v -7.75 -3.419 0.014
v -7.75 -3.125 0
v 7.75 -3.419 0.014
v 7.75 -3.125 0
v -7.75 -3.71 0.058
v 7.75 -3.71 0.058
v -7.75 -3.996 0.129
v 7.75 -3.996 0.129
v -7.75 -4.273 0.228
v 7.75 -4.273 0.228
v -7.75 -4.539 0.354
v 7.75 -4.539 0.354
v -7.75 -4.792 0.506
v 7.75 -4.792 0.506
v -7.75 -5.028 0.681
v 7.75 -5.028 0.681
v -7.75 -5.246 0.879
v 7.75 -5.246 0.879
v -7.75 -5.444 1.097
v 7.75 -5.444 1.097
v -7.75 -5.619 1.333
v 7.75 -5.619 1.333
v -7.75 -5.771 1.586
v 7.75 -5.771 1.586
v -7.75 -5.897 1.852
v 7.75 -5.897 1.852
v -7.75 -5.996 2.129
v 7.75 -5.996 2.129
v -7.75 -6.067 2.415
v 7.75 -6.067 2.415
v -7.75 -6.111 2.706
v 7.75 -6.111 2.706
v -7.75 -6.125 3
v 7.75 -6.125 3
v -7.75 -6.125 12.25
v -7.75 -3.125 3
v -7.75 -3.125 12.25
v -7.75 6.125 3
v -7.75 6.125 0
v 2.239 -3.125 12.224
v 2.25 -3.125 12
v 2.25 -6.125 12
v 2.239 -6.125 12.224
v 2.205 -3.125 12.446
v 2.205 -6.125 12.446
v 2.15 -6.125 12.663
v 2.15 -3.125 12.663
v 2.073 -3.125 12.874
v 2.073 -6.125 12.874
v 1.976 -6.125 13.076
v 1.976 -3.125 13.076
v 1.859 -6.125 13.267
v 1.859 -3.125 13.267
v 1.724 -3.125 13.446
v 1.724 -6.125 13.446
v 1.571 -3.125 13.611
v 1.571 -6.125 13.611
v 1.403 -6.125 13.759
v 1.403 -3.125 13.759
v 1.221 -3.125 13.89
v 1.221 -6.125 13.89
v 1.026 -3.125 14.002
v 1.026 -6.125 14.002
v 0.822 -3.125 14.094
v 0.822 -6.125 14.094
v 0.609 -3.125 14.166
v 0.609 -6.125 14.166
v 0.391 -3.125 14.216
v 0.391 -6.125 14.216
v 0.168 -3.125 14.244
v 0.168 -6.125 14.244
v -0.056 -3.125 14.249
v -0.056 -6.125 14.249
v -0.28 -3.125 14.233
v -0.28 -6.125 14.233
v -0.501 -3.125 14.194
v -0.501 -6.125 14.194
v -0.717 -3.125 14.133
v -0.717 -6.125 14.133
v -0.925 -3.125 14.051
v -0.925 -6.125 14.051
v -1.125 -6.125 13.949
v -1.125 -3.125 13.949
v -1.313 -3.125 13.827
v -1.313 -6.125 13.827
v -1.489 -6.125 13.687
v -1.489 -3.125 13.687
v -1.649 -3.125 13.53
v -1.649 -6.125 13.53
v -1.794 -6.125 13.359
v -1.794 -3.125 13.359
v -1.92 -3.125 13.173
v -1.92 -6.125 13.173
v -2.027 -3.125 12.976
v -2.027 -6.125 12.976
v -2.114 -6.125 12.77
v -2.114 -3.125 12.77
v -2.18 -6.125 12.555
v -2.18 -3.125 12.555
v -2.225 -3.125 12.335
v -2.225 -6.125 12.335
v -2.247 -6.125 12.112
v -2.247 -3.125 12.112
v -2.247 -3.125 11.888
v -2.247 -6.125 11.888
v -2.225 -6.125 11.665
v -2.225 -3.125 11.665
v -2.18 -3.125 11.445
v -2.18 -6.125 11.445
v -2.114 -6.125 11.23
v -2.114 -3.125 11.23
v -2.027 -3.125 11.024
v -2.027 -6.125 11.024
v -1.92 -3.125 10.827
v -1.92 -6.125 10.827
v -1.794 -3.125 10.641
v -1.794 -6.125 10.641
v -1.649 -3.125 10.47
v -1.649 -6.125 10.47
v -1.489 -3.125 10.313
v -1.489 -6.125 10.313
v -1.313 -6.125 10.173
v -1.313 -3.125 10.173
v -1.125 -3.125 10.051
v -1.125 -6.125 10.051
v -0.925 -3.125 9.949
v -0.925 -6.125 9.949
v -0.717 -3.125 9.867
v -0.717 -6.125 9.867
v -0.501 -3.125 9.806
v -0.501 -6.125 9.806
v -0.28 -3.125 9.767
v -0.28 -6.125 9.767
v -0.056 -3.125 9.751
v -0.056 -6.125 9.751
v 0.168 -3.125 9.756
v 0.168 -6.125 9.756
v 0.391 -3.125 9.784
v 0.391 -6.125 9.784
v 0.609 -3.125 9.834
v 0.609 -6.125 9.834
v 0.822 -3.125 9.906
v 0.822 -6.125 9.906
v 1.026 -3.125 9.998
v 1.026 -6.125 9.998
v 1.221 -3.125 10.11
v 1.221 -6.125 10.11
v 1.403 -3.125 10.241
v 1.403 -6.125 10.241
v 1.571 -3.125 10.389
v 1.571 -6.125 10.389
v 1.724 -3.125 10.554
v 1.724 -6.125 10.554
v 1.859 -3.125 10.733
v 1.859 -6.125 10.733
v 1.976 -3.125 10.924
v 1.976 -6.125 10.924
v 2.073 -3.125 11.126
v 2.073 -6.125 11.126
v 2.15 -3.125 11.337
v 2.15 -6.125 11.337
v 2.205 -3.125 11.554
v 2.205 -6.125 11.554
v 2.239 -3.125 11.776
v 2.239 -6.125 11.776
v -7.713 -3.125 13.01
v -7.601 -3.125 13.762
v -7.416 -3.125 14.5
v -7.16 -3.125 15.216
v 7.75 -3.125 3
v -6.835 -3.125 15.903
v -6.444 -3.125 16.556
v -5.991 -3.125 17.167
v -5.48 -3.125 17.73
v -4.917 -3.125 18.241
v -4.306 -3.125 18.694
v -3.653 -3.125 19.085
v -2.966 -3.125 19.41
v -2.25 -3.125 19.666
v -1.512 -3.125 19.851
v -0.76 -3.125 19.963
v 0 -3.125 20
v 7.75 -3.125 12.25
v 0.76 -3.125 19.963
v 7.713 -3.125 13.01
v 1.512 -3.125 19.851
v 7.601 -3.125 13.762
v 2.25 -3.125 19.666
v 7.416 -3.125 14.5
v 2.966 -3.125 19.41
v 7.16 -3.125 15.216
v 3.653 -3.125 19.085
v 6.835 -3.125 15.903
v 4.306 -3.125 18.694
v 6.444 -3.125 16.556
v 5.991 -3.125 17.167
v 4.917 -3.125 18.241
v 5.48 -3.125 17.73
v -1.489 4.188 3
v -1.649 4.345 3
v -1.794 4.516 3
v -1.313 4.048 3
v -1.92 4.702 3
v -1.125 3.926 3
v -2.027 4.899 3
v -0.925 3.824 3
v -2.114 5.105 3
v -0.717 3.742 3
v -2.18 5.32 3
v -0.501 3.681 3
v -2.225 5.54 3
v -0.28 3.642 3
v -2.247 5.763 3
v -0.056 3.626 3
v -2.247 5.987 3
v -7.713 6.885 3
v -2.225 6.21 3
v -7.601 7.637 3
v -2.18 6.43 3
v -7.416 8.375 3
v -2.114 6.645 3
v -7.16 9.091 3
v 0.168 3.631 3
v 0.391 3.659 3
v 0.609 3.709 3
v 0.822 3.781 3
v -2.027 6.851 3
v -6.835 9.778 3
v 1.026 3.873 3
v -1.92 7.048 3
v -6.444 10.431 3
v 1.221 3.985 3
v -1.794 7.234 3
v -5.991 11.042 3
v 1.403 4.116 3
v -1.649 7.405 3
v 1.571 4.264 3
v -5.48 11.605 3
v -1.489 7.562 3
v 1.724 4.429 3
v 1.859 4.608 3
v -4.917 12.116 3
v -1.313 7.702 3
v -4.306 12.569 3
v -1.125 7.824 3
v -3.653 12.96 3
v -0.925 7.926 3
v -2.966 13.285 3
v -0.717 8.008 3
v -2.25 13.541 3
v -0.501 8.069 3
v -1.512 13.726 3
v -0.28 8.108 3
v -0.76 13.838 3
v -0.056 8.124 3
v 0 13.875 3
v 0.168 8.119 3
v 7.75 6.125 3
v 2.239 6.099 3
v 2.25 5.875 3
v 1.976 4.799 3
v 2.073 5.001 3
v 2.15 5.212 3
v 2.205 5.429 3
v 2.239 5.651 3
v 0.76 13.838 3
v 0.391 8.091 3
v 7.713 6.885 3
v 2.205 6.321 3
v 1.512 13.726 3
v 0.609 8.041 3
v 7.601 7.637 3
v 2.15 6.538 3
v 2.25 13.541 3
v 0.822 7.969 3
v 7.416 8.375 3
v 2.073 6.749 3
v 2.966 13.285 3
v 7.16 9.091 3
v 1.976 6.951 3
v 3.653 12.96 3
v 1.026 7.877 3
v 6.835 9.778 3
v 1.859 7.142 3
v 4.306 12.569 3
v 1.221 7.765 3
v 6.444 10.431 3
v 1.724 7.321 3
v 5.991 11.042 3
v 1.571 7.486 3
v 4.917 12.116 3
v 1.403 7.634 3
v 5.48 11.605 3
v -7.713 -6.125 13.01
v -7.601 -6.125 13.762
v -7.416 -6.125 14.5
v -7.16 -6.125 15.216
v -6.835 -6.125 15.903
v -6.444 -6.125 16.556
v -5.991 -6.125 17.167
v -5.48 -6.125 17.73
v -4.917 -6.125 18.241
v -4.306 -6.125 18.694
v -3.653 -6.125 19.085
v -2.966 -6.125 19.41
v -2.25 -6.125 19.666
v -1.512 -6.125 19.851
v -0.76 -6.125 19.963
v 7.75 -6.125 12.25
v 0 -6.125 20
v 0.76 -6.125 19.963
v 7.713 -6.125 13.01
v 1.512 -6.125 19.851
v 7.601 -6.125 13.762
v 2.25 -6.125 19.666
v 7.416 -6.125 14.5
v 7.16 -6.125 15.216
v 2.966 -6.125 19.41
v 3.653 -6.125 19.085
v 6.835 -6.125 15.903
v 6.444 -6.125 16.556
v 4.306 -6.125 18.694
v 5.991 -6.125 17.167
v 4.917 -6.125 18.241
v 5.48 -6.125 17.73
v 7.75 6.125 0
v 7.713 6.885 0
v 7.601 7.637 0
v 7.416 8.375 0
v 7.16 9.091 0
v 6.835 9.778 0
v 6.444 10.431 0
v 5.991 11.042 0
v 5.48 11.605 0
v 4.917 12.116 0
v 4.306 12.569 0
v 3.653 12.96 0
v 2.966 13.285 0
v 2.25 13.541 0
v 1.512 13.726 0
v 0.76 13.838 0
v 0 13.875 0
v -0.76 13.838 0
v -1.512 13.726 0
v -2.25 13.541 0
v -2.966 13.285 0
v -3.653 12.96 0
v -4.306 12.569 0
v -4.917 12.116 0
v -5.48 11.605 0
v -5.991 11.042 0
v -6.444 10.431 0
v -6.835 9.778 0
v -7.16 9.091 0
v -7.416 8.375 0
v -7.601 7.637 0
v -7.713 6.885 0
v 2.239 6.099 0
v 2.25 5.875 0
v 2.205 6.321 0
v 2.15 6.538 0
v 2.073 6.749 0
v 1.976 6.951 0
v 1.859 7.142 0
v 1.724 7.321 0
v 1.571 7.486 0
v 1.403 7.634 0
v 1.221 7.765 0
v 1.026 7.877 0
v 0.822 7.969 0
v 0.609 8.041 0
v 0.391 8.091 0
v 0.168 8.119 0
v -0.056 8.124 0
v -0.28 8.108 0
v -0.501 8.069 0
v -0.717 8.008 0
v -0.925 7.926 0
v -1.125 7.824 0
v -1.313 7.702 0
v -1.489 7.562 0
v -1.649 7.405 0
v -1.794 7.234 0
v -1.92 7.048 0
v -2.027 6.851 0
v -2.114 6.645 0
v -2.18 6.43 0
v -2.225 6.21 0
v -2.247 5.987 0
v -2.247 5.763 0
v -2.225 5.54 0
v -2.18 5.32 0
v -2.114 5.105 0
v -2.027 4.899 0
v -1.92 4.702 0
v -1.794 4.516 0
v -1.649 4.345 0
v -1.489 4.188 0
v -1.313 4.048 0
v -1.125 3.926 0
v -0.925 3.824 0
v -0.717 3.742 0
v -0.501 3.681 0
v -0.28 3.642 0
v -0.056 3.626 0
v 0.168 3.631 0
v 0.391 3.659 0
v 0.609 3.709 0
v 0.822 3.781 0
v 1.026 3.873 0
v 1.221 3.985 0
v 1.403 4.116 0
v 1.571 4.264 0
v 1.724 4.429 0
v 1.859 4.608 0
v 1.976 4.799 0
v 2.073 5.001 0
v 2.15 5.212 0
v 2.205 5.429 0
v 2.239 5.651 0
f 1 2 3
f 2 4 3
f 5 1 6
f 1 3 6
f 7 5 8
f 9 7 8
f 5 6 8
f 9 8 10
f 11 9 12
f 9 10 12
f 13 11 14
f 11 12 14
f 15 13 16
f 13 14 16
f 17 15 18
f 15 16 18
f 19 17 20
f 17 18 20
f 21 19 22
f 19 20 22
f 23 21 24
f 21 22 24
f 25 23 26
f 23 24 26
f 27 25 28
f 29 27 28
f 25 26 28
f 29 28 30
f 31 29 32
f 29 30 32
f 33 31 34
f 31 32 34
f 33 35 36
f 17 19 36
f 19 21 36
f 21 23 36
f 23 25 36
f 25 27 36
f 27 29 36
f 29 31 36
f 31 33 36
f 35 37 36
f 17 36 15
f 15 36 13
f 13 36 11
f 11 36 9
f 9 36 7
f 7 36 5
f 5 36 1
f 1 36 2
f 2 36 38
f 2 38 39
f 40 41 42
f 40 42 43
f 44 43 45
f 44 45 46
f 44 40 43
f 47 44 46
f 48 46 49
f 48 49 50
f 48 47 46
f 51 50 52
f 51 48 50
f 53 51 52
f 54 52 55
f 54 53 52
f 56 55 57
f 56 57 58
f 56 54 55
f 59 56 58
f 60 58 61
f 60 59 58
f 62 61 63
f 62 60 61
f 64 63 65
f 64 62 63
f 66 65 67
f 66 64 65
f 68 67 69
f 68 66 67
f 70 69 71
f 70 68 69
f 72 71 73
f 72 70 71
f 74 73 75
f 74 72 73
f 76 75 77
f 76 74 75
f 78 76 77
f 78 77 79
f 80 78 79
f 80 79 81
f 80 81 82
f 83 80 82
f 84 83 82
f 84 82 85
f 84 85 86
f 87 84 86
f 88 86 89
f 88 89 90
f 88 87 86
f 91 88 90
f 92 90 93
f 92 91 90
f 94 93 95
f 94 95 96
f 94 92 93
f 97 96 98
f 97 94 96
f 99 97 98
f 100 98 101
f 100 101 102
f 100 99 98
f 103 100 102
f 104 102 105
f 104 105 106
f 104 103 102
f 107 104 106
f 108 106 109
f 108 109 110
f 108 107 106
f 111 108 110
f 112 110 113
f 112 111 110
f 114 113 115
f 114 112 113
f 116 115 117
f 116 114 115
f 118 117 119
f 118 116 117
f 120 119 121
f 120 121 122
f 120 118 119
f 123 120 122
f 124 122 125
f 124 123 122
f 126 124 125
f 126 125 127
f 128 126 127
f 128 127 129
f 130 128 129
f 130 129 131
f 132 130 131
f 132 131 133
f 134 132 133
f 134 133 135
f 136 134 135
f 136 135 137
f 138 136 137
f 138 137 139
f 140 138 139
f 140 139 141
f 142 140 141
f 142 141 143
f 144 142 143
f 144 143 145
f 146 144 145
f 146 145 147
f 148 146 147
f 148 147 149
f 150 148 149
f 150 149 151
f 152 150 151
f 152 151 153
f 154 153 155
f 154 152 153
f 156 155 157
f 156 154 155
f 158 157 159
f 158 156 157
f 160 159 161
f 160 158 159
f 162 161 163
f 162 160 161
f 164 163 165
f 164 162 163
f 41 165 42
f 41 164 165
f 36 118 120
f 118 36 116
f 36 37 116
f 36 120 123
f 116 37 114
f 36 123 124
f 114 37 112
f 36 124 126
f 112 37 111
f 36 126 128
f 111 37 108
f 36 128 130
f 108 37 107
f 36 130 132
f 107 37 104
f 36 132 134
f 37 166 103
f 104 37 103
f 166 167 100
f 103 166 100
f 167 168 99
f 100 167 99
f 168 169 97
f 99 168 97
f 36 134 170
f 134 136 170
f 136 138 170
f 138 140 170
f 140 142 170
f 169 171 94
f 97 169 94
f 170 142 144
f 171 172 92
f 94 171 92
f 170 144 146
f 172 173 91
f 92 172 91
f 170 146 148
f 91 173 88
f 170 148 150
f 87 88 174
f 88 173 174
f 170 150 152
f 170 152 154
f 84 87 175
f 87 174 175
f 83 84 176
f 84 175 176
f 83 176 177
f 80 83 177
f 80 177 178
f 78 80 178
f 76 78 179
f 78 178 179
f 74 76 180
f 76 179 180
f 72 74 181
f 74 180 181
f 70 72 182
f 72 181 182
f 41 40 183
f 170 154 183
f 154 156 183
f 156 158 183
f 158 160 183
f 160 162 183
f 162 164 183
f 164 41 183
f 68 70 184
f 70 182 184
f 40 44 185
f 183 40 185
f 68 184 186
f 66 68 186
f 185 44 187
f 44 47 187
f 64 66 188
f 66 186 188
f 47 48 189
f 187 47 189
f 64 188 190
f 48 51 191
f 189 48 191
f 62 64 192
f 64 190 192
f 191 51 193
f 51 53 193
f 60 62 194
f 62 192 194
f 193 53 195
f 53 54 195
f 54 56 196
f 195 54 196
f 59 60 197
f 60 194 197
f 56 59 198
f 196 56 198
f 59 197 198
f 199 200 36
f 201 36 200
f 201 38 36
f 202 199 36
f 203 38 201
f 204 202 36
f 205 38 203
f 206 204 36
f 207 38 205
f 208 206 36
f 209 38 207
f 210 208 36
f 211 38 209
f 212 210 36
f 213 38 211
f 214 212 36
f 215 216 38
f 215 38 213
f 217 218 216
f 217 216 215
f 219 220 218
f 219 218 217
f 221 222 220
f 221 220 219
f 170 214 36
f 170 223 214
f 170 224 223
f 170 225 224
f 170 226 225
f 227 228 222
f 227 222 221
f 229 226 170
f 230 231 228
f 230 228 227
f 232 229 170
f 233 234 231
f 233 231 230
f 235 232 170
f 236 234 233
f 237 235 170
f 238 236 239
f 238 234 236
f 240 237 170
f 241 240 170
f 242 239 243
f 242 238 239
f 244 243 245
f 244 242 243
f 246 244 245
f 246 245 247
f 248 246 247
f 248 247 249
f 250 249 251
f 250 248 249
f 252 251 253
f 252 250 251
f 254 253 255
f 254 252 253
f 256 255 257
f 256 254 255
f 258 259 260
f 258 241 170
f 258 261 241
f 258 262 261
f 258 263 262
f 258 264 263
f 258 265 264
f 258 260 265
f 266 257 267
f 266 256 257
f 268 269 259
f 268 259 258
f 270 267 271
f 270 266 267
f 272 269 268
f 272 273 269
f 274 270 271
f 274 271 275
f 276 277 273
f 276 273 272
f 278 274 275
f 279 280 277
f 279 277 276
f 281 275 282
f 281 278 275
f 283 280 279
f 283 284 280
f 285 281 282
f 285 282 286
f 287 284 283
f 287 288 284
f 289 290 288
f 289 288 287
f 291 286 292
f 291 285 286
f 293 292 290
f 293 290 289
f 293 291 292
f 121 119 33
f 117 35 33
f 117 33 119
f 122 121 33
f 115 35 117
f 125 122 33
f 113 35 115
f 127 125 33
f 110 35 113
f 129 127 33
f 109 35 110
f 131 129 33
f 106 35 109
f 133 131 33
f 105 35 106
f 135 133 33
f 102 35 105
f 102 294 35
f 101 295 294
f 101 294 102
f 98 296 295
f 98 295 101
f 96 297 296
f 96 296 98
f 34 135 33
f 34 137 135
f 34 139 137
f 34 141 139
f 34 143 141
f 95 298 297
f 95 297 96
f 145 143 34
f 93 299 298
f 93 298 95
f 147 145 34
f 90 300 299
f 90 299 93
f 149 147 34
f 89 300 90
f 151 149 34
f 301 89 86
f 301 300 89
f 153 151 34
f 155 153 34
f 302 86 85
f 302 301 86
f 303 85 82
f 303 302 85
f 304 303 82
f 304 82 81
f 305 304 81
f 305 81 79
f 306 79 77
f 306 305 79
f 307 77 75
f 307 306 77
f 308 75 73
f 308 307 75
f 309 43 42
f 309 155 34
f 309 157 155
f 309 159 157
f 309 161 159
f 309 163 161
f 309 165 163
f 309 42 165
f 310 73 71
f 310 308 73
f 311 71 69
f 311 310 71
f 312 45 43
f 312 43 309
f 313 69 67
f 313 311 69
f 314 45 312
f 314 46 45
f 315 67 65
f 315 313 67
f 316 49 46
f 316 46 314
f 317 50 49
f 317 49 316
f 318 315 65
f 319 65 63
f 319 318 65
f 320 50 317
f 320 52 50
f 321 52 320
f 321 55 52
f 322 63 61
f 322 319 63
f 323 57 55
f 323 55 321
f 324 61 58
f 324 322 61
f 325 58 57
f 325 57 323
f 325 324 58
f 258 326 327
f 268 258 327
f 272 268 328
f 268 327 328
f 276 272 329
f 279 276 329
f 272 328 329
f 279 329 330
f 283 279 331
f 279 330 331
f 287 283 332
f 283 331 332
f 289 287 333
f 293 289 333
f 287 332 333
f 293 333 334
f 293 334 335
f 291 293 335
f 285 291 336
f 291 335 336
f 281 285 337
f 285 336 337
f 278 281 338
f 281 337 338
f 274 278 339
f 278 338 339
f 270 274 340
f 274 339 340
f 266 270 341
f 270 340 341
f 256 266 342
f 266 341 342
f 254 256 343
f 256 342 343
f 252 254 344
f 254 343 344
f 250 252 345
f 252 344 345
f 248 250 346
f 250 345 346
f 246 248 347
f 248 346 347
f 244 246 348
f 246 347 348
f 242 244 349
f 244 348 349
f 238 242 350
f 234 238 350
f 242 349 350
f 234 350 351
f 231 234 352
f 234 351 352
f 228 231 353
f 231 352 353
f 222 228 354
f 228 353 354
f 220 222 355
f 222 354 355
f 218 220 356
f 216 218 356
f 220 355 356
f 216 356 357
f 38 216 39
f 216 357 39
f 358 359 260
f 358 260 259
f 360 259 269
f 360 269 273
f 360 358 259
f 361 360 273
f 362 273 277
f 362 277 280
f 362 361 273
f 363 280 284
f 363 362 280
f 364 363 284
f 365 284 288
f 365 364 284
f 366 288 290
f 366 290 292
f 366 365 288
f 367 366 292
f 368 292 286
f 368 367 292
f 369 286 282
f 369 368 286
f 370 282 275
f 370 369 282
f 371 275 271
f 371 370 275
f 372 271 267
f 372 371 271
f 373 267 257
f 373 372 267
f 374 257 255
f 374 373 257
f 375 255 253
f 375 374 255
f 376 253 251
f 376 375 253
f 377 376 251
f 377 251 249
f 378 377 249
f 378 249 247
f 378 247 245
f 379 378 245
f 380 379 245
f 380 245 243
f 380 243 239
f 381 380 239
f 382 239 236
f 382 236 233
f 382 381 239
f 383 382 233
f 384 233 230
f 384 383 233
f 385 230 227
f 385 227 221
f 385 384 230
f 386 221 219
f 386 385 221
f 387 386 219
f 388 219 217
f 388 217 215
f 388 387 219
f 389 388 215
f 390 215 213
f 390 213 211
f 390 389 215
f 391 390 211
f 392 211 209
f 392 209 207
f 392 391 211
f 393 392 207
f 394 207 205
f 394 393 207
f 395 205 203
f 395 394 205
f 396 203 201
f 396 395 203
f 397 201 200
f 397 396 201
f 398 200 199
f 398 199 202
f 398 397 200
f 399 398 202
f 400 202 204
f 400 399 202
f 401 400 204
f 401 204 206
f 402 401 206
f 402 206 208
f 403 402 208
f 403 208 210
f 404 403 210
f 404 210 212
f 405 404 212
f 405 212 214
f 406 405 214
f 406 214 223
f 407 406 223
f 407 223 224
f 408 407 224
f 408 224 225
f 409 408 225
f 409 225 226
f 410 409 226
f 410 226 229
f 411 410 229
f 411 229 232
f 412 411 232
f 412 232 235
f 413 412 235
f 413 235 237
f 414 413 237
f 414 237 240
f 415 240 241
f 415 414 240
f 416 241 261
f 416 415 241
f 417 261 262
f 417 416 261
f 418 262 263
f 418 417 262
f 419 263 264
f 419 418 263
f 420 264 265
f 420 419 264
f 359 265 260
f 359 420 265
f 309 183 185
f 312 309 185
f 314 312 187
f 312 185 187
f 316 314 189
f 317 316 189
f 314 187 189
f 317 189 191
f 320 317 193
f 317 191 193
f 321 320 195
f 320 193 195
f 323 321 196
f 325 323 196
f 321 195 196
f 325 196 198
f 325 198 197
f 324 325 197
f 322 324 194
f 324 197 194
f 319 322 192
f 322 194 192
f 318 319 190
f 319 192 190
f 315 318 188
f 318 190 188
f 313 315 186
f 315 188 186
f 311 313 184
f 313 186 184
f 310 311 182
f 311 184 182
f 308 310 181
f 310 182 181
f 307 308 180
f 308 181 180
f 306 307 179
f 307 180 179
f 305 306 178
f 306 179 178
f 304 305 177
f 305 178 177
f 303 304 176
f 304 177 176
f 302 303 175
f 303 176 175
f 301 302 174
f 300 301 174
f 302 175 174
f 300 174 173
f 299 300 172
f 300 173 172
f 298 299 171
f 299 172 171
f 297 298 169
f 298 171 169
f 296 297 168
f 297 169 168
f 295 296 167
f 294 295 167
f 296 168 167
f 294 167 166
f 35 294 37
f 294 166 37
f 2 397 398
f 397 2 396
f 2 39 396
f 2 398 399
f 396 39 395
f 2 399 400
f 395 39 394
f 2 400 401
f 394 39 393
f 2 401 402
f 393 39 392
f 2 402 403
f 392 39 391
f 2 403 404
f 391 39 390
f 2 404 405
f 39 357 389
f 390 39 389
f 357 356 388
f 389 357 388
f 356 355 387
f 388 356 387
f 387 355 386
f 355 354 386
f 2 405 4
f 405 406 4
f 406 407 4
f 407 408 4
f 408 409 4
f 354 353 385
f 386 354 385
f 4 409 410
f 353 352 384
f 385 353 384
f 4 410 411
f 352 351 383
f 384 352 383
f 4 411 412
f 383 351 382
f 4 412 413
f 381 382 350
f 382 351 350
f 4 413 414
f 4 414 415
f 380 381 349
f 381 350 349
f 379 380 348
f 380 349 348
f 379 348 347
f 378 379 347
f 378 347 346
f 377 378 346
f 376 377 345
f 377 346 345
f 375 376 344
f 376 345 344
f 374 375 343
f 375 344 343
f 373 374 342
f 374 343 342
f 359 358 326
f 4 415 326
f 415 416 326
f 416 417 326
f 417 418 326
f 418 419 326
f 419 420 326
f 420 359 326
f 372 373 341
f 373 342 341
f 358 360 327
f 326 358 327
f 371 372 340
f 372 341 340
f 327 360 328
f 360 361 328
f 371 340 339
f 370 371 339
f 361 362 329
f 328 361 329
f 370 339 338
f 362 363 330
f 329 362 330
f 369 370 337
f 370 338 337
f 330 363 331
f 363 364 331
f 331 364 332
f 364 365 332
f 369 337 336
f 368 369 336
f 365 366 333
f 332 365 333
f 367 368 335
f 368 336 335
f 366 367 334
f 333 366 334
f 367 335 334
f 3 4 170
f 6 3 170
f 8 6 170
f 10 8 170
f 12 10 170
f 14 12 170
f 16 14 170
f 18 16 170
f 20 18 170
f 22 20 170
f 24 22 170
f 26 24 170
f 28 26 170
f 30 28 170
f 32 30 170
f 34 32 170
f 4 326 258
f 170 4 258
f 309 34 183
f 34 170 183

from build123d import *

# Parameters (mm, degrees)
SKETCH1_R           = 2.25
BOSS_EXTRUDE1_DEPTH = 3
CIRPATTERN1_COUNT   = 2
CIRPATTERN1_ANGLE   = 90
FILLET1_R           = 3


with BuildPart() as part:
    # Sketch1 → Boss-Extrude1 (new body)
    with BuildSketch(Plane.XY):
        with BuildLine():
            Line((-7.75, 6.125), (-7.75, -6.125))
            Line((-7.75, -6.125), (7.75, -6.125))
            Line((7.75, -6.125), (7.75, 6.125))
            ThreePointArc((7.75, 6.125), (0, 13.875), (-7.75, 6.125))
        make_face()
        with Locations((0, 5.875)):
            Circle(SKETCH1_R, mode=Mode.SUBTRACT)
    boss_extrude1 = extrude(amount=BOSS_EXTRUDE1_DEPTH)

    # CirPattern1: Boss-Extrude1 ×2 about axis
    cirpattern1_axis = Axis((-8.525, -4.625, 1.5), (1, 0, 0))
    for i in range(1, CIRPATTERN1_COUNT):
        add(boss_extrude1.rotate(cirpattern1_axis, i * CIRPATTERN1_ANGLE / (CIRPATTERN1_COUNT - 1)))

    # Fillet1
    fillet1_edges = [part.edges().sort_by_distance(p)[0] for p in [
        (0, -6.125, 0),
    ]]
    fillet(fillet1_edges, radius=FILLET1_R)


solid = part.part
